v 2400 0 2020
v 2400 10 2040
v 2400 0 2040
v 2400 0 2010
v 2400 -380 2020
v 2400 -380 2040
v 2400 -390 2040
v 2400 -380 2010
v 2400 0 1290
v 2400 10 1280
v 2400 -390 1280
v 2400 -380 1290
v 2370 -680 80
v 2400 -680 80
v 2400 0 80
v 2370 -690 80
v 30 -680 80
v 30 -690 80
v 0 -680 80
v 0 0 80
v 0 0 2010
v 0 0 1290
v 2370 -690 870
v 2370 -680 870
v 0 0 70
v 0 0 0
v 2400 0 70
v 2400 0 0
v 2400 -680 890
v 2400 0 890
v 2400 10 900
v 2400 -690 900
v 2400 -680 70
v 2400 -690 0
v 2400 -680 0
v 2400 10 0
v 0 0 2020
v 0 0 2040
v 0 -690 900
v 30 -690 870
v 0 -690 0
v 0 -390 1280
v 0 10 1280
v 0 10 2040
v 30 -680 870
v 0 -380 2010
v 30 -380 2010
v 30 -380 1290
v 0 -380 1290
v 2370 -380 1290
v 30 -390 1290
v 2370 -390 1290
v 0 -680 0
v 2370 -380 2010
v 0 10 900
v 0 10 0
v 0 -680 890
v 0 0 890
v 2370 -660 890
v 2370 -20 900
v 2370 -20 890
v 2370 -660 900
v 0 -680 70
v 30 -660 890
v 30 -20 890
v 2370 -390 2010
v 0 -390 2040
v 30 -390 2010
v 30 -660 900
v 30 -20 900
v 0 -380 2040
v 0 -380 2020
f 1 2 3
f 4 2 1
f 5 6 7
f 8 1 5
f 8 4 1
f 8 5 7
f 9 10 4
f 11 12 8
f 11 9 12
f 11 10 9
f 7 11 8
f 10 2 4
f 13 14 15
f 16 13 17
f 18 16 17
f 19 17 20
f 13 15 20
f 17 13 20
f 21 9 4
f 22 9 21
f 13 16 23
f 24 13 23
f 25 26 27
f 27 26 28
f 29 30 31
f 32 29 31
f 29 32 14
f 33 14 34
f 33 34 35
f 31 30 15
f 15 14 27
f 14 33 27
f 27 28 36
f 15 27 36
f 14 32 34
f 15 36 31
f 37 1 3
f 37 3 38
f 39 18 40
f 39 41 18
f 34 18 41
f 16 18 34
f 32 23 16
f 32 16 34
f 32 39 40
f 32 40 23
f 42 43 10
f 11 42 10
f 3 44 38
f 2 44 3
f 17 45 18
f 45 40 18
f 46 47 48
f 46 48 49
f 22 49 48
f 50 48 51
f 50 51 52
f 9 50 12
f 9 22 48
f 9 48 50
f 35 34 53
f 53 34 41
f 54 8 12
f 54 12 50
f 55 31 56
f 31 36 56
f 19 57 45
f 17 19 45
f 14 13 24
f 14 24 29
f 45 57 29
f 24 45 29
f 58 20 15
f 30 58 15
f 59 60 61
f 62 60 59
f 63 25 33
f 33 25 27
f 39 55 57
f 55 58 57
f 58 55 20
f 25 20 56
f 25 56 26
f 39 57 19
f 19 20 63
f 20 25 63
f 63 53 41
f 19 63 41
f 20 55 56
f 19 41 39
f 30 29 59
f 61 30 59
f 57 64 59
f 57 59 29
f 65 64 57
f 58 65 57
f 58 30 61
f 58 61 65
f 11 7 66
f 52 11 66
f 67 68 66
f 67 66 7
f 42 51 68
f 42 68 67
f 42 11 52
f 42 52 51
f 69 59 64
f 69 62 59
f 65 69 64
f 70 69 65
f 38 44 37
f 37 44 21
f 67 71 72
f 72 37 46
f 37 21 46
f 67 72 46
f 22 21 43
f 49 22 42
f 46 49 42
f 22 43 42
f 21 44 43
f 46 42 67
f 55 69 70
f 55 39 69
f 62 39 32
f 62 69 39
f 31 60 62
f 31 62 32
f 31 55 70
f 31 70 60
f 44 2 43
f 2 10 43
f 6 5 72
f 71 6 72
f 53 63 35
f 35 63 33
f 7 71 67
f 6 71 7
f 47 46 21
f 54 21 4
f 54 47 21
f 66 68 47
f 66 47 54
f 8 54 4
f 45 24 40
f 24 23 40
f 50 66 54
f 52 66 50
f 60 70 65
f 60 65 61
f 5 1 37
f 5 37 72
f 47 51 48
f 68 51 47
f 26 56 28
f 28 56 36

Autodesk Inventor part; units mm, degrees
ref_plane "YZ Plane" through (0, 0, 0) normal (1, 0, 0) x (0, 1, 0)
ref_plane "XZ Plane" through (0, 0, 0) normal (0, 1, 0) x (-1, 0, 0)
sketch "Sketch1" plane through (0, 0, 0) normal (0, 0, 1) x (1, 0, 0)
  line L0 (0, 0) -> (2400, 0)
  line L1 (2400, 0) -> (2400, 10)
  line L2 (2400, 10) -> (0, 10)
  line L3 (0, 10) -> (0, 0)
  dimension "ancho" = 2400
  dimension "espesor" = 10
extrude "Extrusion1" add sketch "Sketch1" along normal blind 900
sketch "Sketch2" plane through (0, 0, 0) normal (0, -1, 0) x (1, 0, 0)
  line L0 (0, 0) -> (2400, 0) construction
  line L1 (2400, 0) -> (2400, 900) construction
  line L2 (0, 900) -> (2400, 900) construction
  line L3 (0, 0) -> (0, 900) construction
  line L4 (0, 0) -> (0, 900) projected
  line L5 (0, 70) -> (2400, 70)
  line L6 (2400, 70) -> (2400, 80)
  line L7 (2400, 80) -> (0, 80)
  line L8 (0, 80) -> (0, 70)
  line L9 (0, 900) -> (2400, 900) projected
  line L10 (2400, 0) -> (2400, 900) projected
  line L11 (0, 900) -> (2400, 900)
  line L12 (2400, 900) -> (2400, 890)
  line L13 (2400, 890) -> (0, 890)
  line L14 (0, 890) -> (0, 900)
  dimension "d5" = 10
  dimension "d6" = 10
  dimension "d7" = 80
extrude "Extrusion2" add sketch "Sketch2" along normal blind 690 contours L4 L7 L6 L5 | L4 L9 L10 L13
sketch "Sketch3" plane through (0, 0, 900) normal (0, 0, 1) x (1, 0, 0)
  line L0 (2400, 10) -> (2400, -690) projected
  line L1 (2400, 10) -> (0, 10) projected
  line L2 (0, 10) -> (0, -690) projected
  line L3 (2400, -690) -> (0, -690) projected
  line L4 (30, -660) -> (30, -20)
  line L5 (30, -20) -> (2370, -20)
  line L6 (2370, -20) -> (2370, -660)
  line L7 (2370, -660) -> (30, -660)
  point P0 (0, 0)
  dimension "d10" = 30
extrude "Extrusion3" cut sketch "Sketch3" against normal up to next contours L4 L5 L6 L7
sketch "Sketch4" plane through (0, -690, 0) normal (0, -1, 0) x (1, 0, 0)
  line L0 (0, 70) -> (2400, 70) construction
  line L1 (2400, 70) -> (2400, 80) construction
  line L2 (2400, 80) -> (0, 80) construction
  line L3 (0, 80) -> (0, 70) construction
  line L4 (0, 900) -> (0, 890) construction
  line L5 (0, 890) -> (2400, 890) construction
  line L6 (2400, 890) -> (2400, 900) construction
  line L7 (2400, 900) -> (0, 900) construction
  line L8 (2400, 70) -> (0, 70) construction
  line L9 (0, 0) -> (0, 70) construction
  line L10 (0, 0) -> (2400, 0) construction
  line L11 (2400, 0) -> (2400, 70) construction
  line L12 (0, 900) -> (2400, 900)
  line L13 (2400, 900) -> (2400, 0)
  line L14 (2400, 0) -> (0, 0)
  line L15 (0, 0) -> (0, 900)
  line L16 (2400, 80) -> (0, 80) projected
  line L17 (30, 80) -> (2370, 80)
  line L18 (2370, 80) -> (2370, 890)
  line L19 (2370, 890) -> (30, 890)
  line L20 (30, 890) -> (30, 80)
  dimension "d13" = 30
  dimension "d14" = 30
extrude "Extrusion4" add sketch "Sketch4" against normal blind 10 contours L12 L13 L16 L18 L19 L20 L15 | L16 L13 L14 L15
ref_plane "Work Plane1" through (0, 0, 1280) normal (0, 0, 1) x (1, 0, 0)
sketch "Sketch5" plane through (0, 0, 1280) normal (0, 0, 1) x (1, 0, 0)
  line L0 (2400, 10) -> (0, 10) projected
  line L1 (0, 10) -> (0, -690) projected
  line L2 (2400, 10) -> (2400, -690) projected
  line L3 (2400, -690) -> (0, -690) projected
  line L4 (0, 10) -> (2400, 10)
  line L5 (2400, 10) -> (2400, -390)
  line L6 (2400, -390) -> (0, -390)
  line L7 (0, -390) -> (0, 10)
  line L8 (2370, -660) -> (2370, -20) projected
  line L9 (0, -390) -> (2370, -390)
  line L10 (2370, -390) -> (2370, -380)
  line L11 (2370, -380) -> (0, -380)
  line L12 (0, -380) -> (0, -390)
  point P0 (0, 0)
  dimension "d36" = 2400
  dimension "profundidad2" = 400
  dimension "d39" = 10
extrude "Extrusion5" add sketch "Sketch5" along normal blind 10 contours L2 L6 L8 L11 L1 L0 | L11 L8 L6 L1
sketch "Sketch9" plane through (0, -690, 0) normal (0, -1, 0) x (1, 0, 0)
  line L0 (30, 890) -> (2370, 890) construction
  line L1 (2370, 80) -> (30, 80) construction
  line L2 (0, 900) -> (0, 0) construction
  line L3 (2400, 0) -> (0, 0) construction
  line L4 (2400, 900) -> (2400, 0) construction
  line L5 (2400, 900) -> (0, 900) construction
  line L6 (2400, 70) -> (2400, 0) projected
  line L7 (0, 900) -> (2400, 900)
  line L8 (2400, 900) -> (2400, 870)
  line L9 (2400, 870) -> (0, 870)
  line L10 (0, 870) -> (0, 900)
  line L11 (2370, 890) -> (2370, 80) projected
  line L12 (30, 80) -> (30, 890) projected
  point P0 (2400, 890)
  point P1 (2400, 80)
  dimension "d32" = 30
extrude "Extrusion9" add sketch "Sketch9" against normal blind 10
sketch "Boceto10" plane through (0, 0, 1290) normal (0, 0, 1) x (1, 0, 0)
  line L0 (0, 10) -> (0, -390) projected
  line L1 (0, -390) -> (2400, -390) projected
  line L2 (2400, -390) -> (2400, 10) projected
  line L3 (2400, 10) -> (0, 10) projected
  line L4 (2400, 10) -> (2400, -690) projected
  line L5 (0, -390) -> (2400, -390)
  line L6 (2400, -390) -> (2400, -380)
  line L7 (2400, -380) -> (0, -380)
  line L8 (0, -380) -> (0, -390)
  line L9 (0, 10) -> (2400, 10)
  line L10 (2400, 10) -> (2400, 0)
  line L11 (2400, 0) -> (0, 0)
  line L12 (0, 0) -> (0, 10)
  point P0 (0, 0)
  dimension "d40" = 10
  dimension "d41" = 10
extrude "Extrusión10" add sketch "Boceto10" along normal blind 750 contours L3 L2 L11 L0 | L7 L2 L1 L0
sketch "Boceto11" plane through (0, -390, 1280) normal (0, -1, 0) x (1, 0, 0)
  line L0 (0, 760) -> (2400, 760) projected
  line L1 (2400, 0) -> (2400, 760) projected
  line L2 (0, 760) -> (2400, 760) projected
  line L3 (0, 0) -> (0, 760) projected
  line L4 (30, 730) -> (2370, 730)
  line L5 (2370, 730) -> (2370, 10)
  line L6 (2370, 10) -> (30, 10)
  line L7 (30, 10) -> (30, 730)
  line L8 (0, 0) -> (2400, 0) projected
  point P0 (0, -1280)
  dimension "d44" = 30
  dimension "d45" = 30
  dimension "d46" = 30
extrude "Extrusión11" cut sketch "Boceto11" against normal up to next contours L4 L5 L6 L7
sketch "Sketch13" plane through (2400, -390, 1280) normal (1, 0, 0) x (0, 0, -1)
  line L0 (0, 0) -> (0, 400) construction
  line L1 (0, 400) -> (-760, 400) construction
  line L2 (-10, 390) -> (-760, 390) construction
  line L3 (-10, 10) -> (-760, 10) construction
  line L4 (-760, 0) -> (-760, 10) construction
  line L5 (0, 0) -> (-760, 0) construction
  line L6 (1280, 400) -> (-760, 400) projected
  line L7 (-740, 0) -> (-730, 0)
  line L8 (-730, 0) -> (-730, 400)
  line L9 (-730, 400) -> (-740, 400)
  line L10 (-740, 400) -> (-740, 0)
  line L11 (-760, 390) -> (-760, 400) projected
  line L12 (-10, 10) -> (-10, 390) projected
  point P0 (1280, 390)
  point P1 (1030, 400)
  dimension "d53" = 10
  dimension "d54" = 20
extrude "Extrusion13" add sketch "Sketch13" against normal blind 2400
equation "\"d5\" = espesor"
equation "\"d6\" = espesor"
equation "\"d10\" = 3 * espesor"
equation "\"d13\" = 3 * espesor"
equation "\"d14\" = 3 * espesor"
equation "\"d15\" = espesor"
equation "\"d36\" = ancho"
equation "\"d39\" = espesor"
equation "\"d18\" = espesor"
equation "\"d32\" = 3 * espesor"
equation "\"d33\" = espesor"
equation "\"d40\" = espesor"
equation "\"d41\" = espesor"
equation "\"d44\" = 3 * espesor"
equation "\"d45\" = 3 * espesor"
equation "\"d46\" = 3 * espesor"
equation "\"d53\" = espesor"
equation "\"d54\" = 2 * espesor"
equation "\"d55\" = ancho"
properties part number "esqueleto_mueble"
